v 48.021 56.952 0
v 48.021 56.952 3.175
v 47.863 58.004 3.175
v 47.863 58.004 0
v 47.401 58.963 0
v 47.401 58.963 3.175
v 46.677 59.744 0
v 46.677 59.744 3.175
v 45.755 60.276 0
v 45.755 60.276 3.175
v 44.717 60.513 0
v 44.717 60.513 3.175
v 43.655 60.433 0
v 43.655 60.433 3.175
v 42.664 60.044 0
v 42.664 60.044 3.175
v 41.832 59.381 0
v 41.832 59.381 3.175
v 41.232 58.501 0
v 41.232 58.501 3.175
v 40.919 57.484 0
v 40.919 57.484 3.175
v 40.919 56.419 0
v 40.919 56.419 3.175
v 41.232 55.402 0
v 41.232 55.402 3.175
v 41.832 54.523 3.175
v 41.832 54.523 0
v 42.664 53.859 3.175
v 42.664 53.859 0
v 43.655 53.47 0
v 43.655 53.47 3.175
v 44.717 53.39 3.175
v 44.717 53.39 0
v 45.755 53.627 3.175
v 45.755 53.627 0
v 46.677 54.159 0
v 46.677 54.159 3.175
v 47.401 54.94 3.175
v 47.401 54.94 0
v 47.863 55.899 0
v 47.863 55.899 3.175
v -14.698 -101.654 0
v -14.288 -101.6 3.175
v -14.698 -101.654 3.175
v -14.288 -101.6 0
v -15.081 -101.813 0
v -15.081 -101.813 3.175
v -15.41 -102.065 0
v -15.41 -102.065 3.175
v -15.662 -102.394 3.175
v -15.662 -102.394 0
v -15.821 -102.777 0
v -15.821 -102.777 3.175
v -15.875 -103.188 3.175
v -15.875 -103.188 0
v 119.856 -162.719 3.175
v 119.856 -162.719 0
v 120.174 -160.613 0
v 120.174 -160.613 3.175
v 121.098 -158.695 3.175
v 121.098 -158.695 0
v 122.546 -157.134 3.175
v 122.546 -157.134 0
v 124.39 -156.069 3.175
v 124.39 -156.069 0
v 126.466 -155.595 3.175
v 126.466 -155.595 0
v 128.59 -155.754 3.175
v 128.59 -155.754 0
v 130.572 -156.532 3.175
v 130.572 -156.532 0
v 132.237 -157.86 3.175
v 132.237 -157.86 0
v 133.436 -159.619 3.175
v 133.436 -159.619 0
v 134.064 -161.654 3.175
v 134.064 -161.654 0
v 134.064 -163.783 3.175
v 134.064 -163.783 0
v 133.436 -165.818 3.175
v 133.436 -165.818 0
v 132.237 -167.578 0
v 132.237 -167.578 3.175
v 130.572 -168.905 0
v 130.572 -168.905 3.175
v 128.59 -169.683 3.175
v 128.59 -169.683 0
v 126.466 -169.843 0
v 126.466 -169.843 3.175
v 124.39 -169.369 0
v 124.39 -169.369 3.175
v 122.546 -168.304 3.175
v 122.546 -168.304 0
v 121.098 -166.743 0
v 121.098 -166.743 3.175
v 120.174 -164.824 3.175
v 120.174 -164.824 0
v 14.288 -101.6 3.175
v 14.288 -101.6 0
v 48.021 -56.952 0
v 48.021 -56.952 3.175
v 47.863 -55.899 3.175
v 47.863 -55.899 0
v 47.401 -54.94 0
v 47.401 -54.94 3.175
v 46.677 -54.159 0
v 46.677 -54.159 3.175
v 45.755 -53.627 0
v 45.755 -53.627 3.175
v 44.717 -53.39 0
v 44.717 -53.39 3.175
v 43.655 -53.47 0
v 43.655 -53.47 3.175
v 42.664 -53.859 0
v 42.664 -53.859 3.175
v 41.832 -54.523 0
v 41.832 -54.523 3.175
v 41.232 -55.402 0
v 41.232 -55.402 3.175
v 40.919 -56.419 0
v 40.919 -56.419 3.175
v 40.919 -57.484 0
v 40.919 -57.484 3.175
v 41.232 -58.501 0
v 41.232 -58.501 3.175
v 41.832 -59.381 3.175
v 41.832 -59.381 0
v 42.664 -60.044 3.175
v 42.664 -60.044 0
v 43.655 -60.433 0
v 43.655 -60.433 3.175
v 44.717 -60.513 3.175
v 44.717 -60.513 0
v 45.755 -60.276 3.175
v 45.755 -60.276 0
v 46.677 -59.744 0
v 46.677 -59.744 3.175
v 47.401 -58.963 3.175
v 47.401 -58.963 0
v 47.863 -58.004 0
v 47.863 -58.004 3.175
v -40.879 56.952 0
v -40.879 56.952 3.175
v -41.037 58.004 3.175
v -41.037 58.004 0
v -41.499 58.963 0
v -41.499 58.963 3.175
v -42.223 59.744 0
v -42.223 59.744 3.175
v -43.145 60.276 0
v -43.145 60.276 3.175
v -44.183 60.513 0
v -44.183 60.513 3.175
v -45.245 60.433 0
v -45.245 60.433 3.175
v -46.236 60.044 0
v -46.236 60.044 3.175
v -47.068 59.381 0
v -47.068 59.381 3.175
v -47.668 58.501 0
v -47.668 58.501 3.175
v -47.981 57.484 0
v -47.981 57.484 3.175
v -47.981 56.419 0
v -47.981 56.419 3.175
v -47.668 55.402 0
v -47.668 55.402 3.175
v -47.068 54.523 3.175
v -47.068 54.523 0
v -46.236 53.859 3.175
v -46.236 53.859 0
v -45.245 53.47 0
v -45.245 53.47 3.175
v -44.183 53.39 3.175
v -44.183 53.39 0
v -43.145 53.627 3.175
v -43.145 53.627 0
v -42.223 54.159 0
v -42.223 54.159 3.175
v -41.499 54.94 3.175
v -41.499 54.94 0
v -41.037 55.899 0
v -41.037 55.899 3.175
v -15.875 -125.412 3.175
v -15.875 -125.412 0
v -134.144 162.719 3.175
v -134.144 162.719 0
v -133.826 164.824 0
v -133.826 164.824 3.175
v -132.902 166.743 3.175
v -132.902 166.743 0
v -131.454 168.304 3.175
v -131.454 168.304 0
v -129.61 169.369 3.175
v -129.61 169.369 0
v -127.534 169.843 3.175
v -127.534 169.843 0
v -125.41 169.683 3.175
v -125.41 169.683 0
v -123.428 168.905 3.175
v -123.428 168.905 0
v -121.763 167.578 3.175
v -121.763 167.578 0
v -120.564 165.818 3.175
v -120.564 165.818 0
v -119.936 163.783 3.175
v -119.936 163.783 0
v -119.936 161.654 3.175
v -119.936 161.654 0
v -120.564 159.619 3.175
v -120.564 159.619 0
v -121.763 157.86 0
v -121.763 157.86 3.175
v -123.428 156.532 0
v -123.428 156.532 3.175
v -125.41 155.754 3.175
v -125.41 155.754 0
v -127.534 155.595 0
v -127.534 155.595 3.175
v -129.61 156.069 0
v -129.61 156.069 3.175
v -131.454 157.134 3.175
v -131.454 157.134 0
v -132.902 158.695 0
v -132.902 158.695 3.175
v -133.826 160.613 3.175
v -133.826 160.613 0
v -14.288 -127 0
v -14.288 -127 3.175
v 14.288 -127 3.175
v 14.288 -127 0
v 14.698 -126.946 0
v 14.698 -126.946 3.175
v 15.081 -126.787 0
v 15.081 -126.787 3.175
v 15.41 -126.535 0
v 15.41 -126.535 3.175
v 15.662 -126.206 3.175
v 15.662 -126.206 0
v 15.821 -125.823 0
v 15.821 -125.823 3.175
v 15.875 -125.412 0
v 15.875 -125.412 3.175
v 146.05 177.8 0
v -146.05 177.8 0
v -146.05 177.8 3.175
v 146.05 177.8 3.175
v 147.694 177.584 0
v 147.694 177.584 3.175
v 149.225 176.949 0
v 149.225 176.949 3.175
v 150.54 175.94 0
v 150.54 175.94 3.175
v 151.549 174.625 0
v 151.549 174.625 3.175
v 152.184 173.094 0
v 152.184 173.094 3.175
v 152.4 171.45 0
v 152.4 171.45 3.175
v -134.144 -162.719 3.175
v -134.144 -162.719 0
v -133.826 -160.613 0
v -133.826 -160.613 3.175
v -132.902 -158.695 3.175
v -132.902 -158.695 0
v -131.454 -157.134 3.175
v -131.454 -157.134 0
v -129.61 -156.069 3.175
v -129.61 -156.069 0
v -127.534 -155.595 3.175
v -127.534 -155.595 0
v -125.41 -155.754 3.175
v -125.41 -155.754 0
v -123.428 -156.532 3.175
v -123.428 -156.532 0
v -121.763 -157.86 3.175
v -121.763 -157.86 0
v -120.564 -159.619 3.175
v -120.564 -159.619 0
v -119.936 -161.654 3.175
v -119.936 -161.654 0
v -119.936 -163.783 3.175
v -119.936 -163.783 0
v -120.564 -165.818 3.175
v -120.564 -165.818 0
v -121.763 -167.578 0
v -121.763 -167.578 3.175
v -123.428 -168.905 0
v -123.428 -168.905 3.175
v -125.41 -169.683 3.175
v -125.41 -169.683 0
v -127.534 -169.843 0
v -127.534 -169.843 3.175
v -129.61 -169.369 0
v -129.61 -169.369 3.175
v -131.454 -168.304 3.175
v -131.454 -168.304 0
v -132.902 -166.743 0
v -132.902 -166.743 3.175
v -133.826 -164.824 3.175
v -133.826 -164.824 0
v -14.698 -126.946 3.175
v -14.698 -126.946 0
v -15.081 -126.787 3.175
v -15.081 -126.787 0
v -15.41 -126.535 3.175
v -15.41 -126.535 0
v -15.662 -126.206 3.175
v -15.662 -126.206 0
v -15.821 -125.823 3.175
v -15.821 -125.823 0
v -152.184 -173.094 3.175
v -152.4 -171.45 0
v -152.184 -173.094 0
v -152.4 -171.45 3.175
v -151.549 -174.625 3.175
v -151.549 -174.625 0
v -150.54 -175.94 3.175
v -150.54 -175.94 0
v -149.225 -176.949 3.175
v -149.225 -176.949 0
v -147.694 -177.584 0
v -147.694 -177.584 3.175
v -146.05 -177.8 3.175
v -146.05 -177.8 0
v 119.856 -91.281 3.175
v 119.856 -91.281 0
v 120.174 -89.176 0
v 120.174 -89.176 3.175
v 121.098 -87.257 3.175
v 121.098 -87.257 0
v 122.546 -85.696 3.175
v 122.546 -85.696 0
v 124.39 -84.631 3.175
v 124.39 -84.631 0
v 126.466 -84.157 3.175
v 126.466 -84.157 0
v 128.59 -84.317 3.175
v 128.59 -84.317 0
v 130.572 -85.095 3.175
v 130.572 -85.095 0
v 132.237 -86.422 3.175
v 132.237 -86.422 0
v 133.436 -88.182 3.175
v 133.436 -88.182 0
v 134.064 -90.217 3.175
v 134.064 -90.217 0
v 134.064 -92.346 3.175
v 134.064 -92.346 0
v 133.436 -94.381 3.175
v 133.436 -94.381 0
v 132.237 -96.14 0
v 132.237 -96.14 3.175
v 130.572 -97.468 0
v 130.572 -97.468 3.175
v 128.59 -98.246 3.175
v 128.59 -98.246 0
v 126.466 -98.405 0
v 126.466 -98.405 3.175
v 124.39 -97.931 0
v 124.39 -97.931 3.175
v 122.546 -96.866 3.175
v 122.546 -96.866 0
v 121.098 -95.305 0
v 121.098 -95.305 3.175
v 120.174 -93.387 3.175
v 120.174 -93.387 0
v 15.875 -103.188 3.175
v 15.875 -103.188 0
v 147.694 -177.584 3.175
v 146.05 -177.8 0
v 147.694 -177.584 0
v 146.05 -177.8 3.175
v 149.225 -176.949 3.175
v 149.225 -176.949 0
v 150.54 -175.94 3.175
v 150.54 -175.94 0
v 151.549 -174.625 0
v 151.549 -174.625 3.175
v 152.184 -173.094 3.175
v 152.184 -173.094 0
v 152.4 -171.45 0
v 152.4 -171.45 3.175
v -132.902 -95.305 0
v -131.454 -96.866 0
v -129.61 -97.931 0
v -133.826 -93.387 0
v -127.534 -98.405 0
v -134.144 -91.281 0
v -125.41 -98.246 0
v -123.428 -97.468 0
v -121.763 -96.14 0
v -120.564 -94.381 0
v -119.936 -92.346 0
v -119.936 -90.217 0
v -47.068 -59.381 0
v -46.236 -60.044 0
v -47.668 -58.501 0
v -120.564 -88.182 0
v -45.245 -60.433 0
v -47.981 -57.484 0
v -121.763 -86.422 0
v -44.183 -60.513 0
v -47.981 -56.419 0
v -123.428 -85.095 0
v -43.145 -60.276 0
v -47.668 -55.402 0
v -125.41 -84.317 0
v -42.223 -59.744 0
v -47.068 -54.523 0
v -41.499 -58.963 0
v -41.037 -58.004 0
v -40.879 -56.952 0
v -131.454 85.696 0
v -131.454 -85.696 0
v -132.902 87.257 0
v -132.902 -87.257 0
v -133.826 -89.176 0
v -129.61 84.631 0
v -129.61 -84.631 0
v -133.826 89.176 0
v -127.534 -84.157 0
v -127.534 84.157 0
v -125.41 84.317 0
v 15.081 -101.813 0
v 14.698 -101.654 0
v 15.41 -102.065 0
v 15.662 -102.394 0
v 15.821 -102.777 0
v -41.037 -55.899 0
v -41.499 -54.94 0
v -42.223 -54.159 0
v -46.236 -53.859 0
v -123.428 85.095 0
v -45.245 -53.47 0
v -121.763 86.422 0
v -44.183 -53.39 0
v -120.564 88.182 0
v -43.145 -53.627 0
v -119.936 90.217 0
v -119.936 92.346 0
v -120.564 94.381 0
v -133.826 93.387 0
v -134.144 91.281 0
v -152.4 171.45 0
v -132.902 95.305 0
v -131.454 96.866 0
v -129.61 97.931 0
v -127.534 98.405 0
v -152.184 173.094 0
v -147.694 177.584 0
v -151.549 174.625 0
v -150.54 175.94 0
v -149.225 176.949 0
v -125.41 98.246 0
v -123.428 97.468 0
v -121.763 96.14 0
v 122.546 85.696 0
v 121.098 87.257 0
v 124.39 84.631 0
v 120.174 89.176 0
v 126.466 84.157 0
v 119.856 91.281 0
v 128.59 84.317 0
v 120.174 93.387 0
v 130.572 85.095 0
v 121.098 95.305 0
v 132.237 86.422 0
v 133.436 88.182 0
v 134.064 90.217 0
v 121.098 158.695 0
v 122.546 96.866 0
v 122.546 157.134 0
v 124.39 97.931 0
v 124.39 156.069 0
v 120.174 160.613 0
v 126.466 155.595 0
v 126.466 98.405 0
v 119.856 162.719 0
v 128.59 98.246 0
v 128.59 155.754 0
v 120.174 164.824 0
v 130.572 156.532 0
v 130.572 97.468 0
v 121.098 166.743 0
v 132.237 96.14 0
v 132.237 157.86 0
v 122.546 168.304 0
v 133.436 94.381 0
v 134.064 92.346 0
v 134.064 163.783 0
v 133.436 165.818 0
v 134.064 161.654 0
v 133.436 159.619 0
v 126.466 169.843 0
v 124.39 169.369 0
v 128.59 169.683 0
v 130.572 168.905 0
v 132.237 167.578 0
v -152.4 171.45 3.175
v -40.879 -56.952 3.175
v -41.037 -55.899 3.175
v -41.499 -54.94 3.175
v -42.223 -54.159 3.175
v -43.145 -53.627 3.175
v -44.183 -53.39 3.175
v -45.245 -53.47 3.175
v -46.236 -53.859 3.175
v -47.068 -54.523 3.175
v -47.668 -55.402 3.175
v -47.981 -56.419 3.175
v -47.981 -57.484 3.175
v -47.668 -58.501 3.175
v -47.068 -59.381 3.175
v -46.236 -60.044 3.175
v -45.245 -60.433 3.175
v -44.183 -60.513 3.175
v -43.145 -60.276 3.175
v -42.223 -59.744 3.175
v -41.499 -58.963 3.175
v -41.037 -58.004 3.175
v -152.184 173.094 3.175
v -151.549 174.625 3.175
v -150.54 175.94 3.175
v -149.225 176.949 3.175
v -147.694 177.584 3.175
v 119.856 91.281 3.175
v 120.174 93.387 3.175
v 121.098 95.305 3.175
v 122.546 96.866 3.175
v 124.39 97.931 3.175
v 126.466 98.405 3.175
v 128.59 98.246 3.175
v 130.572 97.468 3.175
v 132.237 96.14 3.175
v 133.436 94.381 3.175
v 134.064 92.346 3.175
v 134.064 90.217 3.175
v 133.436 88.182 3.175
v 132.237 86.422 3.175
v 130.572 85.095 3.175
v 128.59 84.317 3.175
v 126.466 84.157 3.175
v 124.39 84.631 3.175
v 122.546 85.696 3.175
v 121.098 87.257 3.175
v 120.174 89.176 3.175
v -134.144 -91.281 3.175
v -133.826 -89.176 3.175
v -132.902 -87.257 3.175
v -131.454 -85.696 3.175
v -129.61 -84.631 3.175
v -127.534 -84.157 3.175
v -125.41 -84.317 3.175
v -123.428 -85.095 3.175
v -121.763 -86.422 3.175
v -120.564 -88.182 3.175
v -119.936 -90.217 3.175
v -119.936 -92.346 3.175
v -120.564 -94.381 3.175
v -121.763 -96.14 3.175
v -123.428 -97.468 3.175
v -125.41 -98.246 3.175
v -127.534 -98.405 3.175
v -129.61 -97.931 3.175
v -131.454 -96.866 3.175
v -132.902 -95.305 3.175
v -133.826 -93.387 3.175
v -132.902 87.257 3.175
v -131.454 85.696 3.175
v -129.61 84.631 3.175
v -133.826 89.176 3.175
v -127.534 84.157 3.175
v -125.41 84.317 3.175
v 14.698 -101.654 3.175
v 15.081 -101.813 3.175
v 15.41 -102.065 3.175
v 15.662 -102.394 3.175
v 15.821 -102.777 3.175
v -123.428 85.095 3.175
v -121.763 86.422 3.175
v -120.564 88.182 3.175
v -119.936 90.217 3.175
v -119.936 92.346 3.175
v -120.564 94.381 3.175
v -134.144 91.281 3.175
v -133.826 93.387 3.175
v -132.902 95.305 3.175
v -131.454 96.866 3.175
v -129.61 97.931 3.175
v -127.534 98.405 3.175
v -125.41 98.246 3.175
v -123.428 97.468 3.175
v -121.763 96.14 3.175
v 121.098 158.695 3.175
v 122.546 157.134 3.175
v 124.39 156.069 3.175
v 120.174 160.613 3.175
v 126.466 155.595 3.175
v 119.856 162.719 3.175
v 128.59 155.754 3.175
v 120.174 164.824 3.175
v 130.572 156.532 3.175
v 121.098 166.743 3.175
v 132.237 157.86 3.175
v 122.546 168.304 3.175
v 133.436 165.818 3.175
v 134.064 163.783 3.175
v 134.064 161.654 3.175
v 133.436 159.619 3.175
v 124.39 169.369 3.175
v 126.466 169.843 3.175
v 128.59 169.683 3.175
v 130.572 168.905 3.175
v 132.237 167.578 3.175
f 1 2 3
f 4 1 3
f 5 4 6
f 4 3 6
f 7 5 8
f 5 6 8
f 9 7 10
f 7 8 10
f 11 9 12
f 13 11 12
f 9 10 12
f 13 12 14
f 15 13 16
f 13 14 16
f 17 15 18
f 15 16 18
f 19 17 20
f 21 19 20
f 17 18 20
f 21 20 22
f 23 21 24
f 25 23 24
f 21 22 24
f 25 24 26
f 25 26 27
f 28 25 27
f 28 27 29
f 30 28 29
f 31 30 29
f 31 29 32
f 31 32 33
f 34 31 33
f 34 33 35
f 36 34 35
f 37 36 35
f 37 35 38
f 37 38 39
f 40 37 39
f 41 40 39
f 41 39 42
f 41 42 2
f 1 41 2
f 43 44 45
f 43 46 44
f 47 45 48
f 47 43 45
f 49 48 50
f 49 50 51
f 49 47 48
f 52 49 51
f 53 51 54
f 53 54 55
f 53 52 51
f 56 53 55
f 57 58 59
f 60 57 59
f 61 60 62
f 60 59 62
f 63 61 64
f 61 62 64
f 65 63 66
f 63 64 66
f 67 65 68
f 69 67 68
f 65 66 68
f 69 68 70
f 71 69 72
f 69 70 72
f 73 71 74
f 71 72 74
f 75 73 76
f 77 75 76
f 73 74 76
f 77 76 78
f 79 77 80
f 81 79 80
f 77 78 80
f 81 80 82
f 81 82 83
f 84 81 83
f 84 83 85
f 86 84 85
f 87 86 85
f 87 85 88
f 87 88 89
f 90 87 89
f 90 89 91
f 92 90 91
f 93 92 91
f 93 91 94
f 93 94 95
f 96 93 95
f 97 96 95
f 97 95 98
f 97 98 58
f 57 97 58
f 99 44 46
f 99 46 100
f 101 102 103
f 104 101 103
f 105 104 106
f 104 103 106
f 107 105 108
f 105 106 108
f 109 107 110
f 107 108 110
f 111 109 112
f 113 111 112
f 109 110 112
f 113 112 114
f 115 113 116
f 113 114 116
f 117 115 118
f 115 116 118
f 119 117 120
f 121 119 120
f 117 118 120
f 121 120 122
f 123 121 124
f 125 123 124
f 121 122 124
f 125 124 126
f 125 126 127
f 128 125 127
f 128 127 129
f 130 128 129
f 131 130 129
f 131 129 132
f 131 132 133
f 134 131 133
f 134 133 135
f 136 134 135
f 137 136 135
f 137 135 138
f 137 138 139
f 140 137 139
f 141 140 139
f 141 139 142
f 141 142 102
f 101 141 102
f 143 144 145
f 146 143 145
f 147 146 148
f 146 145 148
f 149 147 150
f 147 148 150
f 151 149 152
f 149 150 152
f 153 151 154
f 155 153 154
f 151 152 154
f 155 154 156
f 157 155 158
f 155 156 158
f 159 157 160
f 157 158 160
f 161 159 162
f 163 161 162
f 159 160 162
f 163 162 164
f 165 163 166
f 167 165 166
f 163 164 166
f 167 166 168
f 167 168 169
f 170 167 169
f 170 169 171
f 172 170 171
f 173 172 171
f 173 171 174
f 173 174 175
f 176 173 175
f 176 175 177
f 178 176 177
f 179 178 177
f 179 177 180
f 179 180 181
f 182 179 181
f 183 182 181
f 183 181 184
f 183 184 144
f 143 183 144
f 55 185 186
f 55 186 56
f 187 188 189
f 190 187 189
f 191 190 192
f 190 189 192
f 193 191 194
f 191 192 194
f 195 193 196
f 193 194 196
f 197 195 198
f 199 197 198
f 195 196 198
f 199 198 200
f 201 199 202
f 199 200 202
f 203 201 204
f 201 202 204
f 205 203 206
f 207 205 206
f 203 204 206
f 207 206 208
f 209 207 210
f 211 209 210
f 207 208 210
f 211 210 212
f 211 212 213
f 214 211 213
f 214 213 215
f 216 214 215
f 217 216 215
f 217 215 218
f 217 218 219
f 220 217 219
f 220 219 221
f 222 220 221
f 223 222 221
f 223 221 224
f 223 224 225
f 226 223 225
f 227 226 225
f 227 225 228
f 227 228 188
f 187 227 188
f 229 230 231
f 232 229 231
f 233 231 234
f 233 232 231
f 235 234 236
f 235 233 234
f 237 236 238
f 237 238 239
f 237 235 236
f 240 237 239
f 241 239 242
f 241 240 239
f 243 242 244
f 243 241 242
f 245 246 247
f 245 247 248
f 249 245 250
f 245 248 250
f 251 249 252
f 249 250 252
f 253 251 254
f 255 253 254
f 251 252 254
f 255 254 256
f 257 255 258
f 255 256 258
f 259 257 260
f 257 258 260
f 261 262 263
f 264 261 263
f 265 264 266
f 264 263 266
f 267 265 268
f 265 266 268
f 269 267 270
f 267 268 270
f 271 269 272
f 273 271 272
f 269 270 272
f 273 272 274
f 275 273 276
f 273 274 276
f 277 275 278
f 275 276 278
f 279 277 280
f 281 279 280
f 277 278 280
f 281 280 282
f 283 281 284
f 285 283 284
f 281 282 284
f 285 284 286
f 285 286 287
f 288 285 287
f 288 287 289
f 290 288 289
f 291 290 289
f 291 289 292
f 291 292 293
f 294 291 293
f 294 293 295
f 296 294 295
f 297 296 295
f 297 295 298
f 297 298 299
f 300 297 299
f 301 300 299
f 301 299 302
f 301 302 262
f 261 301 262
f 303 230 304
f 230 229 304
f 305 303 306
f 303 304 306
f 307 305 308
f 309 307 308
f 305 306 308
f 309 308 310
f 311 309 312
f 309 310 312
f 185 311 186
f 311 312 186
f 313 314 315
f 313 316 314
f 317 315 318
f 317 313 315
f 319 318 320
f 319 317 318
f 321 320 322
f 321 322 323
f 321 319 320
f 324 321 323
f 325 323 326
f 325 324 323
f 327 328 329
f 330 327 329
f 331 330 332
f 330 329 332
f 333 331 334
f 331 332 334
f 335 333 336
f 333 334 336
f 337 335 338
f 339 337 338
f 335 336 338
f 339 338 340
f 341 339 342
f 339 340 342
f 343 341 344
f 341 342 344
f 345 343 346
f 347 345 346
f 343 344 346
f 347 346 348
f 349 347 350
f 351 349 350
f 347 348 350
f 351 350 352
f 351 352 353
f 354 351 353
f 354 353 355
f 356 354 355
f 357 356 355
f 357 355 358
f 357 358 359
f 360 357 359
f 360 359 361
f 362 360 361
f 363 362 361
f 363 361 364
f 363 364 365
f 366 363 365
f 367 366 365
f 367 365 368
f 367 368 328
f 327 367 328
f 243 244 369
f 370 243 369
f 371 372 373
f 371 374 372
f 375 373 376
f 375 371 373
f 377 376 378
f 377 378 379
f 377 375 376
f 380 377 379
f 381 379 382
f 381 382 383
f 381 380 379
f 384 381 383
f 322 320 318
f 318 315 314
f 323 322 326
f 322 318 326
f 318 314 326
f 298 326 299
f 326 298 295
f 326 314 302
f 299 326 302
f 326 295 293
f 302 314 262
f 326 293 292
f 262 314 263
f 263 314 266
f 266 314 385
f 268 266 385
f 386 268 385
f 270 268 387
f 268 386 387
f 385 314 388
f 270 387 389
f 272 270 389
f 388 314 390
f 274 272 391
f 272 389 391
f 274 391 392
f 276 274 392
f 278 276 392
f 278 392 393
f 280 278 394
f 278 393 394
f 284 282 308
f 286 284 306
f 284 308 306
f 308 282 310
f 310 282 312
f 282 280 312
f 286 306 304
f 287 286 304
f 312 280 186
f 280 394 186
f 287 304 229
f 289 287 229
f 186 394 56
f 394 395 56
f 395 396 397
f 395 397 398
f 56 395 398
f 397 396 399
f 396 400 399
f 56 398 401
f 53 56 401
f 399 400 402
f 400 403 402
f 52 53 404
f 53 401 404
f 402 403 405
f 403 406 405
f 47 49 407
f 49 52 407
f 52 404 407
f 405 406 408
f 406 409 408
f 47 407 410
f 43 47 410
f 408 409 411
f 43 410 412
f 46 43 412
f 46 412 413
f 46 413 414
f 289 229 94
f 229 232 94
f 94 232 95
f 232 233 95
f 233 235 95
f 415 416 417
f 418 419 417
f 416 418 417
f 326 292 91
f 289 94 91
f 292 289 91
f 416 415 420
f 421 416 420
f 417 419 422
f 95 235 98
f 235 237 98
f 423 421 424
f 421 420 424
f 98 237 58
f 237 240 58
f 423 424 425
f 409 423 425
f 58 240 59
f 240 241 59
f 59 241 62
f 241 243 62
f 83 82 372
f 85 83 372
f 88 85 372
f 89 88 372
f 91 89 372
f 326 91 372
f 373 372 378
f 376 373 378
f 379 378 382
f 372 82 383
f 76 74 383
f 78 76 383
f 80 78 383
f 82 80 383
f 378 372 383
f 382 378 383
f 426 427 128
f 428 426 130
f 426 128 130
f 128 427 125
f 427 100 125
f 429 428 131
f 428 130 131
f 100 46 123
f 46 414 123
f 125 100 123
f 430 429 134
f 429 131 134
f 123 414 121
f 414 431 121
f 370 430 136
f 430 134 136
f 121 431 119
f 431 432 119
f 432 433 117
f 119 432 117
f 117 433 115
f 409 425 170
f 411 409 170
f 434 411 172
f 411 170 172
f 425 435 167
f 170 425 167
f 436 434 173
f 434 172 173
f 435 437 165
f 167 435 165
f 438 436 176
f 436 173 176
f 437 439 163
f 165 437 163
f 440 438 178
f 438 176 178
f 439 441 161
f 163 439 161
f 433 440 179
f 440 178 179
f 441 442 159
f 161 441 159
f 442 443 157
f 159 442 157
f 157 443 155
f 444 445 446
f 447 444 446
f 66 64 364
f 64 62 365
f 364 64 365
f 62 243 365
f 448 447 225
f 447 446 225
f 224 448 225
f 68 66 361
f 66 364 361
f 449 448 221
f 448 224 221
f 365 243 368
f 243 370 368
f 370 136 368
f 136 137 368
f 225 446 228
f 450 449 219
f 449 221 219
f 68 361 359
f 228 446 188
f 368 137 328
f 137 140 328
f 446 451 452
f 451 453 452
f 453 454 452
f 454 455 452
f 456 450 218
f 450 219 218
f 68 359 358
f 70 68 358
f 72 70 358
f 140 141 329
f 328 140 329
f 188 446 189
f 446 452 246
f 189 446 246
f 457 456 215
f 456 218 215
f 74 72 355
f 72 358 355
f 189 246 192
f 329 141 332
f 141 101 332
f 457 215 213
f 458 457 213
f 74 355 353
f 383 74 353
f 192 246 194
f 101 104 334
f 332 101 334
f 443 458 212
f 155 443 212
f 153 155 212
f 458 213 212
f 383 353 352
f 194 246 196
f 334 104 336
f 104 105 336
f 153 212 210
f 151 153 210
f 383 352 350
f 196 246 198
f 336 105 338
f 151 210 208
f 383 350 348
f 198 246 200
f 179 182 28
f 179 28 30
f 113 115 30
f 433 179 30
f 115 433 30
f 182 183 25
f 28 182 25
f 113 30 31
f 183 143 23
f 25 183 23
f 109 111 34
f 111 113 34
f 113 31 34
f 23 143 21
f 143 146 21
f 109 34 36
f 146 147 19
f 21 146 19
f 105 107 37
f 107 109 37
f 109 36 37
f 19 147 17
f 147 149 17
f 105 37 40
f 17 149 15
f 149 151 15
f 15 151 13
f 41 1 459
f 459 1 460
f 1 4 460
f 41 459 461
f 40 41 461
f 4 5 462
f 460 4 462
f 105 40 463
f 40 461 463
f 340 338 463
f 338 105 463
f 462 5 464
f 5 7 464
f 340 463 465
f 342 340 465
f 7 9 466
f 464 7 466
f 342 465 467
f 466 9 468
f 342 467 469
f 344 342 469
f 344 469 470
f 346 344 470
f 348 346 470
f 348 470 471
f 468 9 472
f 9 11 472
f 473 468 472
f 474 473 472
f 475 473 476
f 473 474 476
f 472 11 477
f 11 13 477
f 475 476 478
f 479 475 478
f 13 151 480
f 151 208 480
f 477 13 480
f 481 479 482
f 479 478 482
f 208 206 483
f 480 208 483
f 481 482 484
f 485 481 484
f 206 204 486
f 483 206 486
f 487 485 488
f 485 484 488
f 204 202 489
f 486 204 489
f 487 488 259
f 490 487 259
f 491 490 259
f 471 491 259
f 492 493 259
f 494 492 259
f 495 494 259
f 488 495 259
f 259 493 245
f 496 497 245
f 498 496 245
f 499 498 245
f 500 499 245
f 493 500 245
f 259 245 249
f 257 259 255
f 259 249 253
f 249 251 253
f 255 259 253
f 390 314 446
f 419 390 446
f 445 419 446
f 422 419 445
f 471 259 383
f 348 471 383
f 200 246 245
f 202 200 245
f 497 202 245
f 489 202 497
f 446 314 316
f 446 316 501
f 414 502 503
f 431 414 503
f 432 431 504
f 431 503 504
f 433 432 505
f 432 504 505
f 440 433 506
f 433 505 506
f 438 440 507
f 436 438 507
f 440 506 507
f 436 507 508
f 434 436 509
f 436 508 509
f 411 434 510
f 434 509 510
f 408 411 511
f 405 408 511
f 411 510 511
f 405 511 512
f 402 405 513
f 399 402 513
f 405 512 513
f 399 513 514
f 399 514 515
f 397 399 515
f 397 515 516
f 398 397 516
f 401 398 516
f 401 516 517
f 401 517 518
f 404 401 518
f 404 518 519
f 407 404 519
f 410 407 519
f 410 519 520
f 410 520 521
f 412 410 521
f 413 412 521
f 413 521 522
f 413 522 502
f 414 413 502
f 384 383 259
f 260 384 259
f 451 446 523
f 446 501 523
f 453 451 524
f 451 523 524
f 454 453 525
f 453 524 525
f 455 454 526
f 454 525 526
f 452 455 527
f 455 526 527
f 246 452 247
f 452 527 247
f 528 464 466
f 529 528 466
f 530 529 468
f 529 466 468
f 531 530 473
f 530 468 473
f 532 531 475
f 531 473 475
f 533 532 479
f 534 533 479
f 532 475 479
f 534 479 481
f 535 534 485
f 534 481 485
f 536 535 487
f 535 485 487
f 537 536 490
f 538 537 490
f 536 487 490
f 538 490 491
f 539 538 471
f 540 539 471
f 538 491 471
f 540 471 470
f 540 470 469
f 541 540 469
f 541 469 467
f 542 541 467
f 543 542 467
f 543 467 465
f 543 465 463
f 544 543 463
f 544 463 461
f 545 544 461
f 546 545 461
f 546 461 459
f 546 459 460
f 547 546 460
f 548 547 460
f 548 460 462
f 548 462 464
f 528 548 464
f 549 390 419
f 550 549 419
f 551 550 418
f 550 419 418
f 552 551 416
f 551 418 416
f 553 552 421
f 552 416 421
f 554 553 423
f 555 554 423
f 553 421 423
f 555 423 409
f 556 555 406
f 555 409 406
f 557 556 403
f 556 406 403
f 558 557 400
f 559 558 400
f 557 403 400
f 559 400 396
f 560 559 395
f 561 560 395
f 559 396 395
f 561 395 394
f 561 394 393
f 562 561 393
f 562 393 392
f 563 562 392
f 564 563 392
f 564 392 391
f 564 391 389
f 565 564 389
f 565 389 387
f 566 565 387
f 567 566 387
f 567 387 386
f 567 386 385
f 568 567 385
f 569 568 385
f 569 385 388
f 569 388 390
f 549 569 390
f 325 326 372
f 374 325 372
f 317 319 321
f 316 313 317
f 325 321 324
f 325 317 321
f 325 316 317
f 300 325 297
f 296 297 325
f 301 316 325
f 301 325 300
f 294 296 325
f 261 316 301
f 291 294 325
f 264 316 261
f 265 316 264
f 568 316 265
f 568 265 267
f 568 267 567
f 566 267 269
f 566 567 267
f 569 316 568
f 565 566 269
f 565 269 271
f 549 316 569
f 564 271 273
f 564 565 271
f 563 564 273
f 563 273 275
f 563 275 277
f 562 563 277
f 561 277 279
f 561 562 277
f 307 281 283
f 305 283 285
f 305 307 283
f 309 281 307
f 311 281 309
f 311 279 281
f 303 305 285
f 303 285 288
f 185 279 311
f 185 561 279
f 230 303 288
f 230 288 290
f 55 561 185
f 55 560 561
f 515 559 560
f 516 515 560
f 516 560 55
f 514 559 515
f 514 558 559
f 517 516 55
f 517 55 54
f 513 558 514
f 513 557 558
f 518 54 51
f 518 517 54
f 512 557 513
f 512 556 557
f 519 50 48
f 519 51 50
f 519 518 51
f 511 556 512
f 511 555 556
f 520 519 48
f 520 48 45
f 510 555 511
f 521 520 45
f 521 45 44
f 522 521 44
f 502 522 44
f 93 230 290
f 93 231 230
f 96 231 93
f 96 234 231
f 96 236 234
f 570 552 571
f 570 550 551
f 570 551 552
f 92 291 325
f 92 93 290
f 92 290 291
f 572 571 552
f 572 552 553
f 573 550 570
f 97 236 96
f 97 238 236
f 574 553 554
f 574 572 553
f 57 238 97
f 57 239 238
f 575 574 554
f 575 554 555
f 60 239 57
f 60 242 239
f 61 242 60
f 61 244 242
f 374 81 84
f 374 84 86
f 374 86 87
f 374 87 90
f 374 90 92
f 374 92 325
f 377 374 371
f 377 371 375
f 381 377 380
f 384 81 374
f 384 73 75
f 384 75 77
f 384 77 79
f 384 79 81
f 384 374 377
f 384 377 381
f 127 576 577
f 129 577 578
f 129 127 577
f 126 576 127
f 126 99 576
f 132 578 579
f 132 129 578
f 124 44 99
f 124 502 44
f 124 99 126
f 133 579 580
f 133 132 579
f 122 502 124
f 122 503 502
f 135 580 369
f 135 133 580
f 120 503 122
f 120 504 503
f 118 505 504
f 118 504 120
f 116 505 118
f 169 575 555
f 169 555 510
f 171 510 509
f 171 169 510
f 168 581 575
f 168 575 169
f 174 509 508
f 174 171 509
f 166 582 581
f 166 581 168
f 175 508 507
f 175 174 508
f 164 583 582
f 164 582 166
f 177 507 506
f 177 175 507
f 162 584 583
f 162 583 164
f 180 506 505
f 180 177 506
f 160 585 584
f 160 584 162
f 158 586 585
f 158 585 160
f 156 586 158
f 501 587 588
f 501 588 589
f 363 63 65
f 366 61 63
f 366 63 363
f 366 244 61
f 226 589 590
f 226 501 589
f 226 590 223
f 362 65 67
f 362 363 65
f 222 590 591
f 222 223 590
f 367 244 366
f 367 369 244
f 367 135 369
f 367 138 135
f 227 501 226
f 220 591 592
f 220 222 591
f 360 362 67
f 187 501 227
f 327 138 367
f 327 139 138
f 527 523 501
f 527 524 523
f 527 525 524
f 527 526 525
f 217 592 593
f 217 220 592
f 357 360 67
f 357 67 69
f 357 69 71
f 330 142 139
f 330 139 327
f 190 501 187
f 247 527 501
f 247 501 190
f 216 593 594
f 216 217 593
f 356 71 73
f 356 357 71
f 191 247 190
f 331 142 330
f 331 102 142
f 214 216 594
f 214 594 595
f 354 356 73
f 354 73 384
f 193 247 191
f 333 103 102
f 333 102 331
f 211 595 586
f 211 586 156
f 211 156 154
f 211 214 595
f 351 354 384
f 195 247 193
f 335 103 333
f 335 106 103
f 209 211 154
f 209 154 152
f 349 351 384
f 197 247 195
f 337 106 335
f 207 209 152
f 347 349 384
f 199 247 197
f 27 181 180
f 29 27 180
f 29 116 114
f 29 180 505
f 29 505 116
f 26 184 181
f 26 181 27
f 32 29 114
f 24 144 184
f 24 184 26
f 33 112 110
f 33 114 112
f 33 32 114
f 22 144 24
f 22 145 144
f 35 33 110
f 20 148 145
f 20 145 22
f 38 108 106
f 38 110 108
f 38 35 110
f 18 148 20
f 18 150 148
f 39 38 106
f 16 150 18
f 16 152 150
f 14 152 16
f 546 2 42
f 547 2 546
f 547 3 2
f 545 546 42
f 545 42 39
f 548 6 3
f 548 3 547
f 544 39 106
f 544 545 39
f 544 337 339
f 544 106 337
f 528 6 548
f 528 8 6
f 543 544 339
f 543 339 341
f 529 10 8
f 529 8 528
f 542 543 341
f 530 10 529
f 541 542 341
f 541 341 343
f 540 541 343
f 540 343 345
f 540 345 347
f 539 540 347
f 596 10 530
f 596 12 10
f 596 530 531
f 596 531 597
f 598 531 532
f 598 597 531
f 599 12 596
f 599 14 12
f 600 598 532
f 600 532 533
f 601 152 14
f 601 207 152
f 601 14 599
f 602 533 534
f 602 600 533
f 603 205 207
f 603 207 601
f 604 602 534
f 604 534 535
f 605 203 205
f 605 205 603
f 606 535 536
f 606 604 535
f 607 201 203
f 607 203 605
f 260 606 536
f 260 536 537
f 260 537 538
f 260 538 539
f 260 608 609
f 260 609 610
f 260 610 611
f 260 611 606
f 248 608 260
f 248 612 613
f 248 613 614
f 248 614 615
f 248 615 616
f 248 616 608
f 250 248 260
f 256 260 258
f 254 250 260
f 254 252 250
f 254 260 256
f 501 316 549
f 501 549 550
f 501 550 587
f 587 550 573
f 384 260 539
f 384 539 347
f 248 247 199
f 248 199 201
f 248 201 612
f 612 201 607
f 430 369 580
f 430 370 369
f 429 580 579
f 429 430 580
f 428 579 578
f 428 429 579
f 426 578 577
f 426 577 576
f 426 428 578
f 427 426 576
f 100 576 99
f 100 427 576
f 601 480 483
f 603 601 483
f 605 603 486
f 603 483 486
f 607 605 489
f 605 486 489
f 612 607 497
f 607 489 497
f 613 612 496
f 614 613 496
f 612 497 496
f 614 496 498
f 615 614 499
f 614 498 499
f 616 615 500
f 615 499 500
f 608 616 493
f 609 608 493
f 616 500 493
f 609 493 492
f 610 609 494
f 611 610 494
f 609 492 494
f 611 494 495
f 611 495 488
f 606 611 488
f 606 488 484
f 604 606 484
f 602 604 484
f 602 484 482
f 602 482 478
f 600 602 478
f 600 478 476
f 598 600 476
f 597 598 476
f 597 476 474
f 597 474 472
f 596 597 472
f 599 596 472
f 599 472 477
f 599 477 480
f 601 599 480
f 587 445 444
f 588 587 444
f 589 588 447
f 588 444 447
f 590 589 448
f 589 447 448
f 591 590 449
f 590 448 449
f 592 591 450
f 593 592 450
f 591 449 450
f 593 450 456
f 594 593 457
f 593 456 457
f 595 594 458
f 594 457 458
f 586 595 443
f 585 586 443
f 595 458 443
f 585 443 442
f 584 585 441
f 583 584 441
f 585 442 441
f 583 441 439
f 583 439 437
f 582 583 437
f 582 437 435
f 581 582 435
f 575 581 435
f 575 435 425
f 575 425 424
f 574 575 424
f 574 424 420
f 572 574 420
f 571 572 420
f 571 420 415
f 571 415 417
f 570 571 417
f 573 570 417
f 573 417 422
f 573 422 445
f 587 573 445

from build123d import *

# Parameters (mm, degrees)
SKETCH1_W                      = 304.8
SKETCH1_H                      = 355.6
BOSS_EXTRUDE1_DEPTH            = 3.175
F_9_16_0_5625_DIAMETER_HOLE1_D = 14.2875
FILLET1_R                      = 6.35
F_1_4_CLEARANCE_HOLE1_D        = 7.14248
SKETCH2_W                      = 31.75
SKETCH2_H                      = 25.4
CUT_EXTRUDE1_DEPTH             = 4.175
FILLET2_R                      = 1.5875


with BuildPart() as part:
    # Sketch1 → Boss-Extrude1 (new body)
    with BuildSketch(Plane.XY):
        Rectangle(SKETCH1_W, SKETCH1_H)
    extrude(amount=BOSS_EXTRUDE1_DEPTH)

    # 9/16 (0.5625) Diameter Hole1 (through all)
    with Locations(Plane.XY.offset(3.175)):
        with Locations((-127, 162.71875), (-127, 91.28125), (-127, -91.28125), (-127, -162.71875), (127, -162.71875), (127, -91.28125), (127, 91.28125), (127, 162.71875)):
            Hole(F_9_16_0_5625_DIAMETER_HOLE1_D / 2)

    # Fillet1
    fillet1_edges = [part.edges().sort_by_distance(p)[0] for p in [
        (152.4, -177.8, 1.5875),
        (-152.4, -177.8, 1.5875),
        (-152.4, 177.8, 1.5875),
        (152.4, 177.8, 1.5875),
    ]]
    fillet(fillet1_edges, radius=FILLET1_R)

    # 1/4 Clearance Hole1 (through all)
    with Locations(Plane(origin=(0, 0, 0), x_dir=(-1, 0, 0), z_dir=(0, 0, -1))):
        with Locations((-44.45, 56.9515625), (-44.45, -56.9515625), (44.45, 56.9515625), (44.45, -56.9515625)):
            Hole(F_1_4_CLEARANCE_HOLE1_D / 2)

    # Sketch2 → Cut-Extrude1 (cut, through all)
    with BuildSketch(Plane.XY.offset(3.175)):
        with Locations((0, -114.3)):
            Rectangle(SKETCH2_W, SKETCH2_H)
    extrude(amount=-CUT_EXTRUDE1_DEPTH, mode=Mode.SUBTRACT)

    # Fillet2
    fillet2_edges = [part.edges().sort_by_distance(p)[0] for p in [
        (-15.875, -101.6, 1.5875),
        (15.875, -101.6, 1.5875),
        (15.875, -127, 1.5875),
        (-15.875, -127, 1.5875),
    ]]
    fillet(fillet2_edges, radius=FILLET2_R)


solid = part.part
